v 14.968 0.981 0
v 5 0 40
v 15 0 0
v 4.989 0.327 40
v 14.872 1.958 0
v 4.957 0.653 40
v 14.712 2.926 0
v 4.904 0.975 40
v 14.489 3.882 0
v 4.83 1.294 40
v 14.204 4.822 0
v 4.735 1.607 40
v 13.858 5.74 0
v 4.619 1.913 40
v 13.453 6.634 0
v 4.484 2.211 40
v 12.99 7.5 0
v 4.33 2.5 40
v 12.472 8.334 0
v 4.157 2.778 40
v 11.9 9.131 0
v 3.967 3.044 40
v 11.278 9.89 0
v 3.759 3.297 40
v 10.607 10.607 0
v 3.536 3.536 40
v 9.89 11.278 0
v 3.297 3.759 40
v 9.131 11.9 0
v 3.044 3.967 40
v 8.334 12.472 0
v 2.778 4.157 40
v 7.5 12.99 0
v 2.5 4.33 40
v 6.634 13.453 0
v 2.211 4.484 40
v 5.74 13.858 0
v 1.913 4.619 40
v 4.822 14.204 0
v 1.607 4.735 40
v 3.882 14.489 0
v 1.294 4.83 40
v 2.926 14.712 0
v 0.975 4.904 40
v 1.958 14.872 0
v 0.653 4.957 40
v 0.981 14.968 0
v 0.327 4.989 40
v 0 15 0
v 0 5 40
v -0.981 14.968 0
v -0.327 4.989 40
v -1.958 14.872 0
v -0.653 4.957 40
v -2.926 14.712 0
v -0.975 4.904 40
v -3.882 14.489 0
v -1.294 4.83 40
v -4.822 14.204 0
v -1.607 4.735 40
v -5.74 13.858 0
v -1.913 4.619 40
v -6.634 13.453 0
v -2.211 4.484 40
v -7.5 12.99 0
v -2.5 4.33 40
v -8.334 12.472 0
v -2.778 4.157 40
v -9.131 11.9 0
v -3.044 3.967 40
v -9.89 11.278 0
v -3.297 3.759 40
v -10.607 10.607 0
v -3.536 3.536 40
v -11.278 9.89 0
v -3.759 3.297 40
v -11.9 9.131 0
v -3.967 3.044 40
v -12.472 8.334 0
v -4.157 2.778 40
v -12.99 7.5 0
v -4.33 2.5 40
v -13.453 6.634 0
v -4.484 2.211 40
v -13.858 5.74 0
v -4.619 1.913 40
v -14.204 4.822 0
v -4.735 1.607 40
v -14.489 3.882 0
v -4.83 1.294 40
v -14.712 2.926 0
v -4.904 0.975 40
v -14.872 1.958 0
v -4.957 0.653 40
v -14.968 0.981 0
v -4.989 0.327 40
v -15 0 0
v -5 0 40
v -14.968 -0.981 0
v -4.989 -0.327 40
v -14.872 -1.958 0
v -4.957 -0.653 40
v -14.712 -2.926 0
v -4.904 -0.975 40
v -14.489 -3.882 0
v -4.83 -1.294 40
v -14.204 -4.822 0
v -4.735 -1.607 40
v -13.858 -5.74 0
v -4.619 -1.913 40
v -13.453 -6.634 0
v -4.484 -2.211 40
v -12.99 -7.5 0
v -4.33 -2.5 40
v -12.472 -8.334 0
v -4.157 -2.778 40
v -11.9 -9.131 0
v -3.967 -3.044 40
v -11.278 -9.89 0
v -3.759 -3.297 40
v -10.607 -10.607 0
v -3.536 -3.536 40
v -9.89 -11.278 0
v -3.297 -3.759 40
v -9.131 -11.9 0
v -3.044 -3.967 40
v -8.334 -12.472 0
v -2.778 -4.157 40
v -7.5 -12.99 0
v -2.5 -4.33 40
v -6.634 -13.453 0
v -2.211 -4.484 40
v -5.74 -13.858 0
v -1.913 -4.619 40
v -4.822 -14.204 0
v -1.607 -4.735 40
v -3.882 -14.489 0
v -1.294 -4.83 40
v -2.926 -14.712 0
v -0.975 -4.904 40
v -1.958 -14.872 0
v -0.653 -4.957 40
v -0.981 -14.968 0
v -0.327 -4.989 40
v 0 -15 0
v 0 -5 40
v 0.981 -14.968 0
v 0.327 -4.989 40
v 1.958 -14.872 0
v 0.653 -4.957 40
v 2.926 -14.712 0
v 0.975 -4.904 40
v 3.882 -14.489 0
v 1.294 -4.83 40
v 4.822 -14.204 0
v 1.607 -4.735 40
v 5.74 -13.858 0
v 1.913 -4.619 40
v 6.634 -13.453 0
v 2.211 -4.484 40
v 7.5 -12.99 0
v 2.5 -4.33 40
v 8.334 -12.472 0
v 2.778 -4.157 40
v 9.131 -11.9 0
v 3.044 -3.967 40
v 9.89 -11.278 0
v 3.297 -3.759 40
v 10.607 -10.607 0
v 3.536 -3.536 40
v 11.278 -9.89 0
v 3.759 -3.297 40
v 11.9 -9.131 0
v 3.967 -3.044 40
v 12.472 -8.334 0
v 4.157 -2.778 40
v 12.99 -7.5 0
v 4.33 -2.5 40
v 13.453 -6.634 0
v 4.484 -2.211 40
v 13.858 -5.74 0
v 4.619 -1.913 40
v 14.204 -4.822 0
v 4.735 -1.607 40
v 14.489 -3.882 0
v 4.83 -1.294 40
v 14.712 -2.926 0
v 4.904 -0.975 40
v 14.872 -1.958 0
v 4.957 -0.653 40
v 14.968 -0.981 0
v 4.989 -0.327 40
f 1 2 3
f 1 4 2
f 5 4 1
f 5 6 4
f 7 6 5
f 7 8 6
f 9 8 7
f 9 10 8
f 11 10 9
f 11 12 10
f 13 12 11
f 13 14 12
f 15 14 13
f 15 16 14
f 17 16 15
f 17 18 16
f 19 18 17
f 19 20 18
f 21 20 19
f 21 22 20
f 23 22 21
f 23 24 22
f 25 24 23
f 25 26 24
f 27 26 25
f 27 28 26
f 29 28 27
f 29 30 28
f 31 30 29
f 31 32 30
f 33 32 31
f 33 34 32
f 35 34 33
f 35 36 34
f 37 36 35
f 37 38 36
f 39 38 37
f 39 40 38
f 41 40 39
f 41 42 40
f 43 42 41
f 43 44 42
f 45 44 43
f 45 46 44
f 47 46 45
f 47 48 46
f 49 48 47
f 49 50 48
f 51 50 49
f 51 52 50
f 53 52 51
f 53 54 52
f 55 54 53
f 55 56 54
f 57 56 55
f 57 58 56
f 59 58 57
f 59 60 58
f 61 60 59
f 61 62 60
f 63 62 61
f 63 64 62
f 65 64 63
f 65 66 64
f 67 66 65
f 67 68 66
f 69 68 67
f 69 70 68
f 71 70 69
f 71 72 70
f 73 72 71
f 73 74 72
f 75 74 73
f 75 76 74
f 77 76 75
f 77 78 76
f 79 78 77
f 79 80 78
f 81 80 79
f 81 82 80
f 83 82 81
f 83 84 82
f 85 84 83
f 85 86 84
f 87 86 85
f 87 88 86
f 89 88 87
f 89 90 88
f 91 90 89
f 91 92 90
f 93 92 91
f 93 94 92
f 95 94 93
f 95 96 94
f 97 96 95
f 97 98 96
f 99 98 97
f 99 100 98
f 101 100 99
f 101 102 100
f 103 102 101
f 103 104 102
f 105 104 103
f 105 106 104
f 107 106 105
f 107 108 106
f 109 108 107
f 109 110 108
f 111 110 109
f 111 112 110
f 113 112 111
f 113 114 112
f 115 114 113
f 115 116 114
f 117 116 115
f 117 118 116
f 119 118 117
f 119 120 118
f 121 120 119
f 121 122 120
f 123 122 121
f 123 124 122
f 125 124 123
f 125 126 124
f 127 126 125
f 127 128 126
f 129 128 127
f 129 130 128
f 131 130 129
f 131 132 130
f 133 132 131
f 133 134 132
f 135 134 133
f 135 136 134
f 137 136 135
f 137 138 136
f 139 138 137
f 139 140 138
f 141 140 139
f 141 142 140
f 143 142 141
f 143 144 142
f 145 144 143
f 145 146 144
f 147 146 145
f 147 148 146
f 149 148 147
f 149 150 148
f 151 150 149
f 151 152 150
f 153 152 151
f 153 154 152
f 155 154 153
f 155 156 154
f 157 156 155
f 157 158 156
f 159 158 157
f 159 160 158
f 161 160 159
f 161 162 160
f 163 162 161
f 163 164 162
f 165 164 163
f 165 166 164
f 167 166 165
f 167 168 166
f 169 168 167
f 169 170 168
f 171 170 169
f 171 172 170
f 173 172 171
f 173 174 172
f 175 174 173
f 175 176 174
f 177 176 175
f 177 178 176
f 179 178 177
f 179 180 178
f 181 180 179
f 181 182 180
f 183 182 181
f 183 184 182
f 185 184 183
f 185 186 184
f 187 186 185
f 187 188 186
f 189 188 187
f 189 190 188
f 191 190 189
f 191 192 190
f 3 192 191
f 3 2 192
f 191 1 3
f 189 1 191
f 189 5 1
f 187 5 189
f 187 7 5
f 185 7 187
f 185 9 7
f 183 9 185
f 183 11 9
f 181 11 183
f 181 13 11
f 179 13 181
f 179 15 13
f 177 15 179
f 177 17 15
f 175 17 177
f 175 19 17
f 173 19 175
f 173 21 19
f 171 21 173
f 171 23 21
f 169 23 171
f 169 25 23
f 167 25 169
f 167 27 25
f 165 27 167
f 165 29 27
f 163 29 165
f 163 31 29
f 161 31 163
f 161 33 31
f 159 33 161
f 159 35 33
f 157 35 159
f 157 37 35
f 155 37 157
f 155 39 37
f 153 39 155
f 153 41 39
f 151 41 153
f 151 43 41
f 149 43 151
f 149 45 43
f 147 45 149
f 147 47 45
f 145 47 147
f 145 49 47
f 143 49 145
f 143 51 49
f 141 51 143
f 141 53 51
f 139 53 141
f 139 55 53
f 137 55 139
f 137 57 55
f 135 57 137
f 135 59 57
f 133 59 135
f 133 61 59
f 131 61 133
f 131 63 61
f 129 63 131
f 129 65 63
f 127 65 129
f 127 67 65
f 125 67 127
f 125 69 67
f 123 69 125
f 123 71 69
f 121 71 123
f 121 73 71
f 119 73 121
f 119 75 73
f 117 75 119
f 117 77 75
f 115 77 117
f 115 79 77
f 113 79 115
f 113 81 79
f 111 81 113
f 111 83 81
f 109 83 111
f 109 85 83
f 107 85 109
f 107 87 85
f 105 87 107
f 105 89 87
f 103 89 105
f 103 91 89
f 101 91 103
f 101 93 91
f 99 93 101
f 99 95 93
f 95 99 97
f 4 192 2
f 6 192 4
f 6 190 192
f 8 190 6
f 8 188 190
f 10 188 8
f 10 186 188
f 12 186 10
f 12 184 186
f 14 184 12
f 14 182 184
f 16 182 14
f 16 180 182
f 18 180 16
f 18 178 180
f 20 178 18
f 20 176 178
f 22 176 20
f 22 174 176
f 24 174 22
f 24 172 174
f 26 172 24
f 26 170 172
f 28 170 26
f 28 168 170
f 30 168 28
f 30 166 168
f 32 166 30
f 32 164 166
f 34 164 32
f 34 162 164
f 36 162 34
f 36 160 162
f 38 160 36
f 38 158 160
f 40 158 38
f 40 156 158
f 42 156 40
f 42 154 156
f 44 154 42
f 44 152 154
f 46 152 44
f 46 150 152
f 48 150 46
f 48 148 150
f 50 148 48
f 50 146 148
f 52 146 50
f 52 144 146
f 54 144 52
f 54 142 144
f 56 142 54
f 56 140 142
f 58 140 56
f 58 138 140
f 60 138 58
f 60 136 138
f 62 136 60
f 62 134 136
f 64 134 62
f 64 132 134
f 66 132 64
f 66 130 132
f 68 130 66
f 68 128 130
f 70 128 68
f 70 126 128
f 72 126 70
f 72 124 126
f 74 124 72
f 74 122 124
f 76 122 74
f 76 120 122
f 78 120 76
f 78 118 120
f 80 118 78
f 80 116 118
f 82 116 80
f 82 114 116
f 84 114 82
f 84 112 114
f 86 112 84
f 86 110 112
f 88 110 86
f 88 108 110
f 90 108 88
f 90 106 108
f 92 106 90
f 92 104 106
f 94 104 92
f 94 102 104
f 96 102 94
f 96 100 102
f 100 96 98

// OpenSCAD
// ============================================
// CONE / FRUSTUM (parametric)
// ============================================
// param: base_diam=30, top_diam=10, height=40, center=false, $fn_shape=96
// CALL:
cone_shape(base_diam=30, top_diam=10, height=40, center=false, $fn_shape=96);

module cone_shape(base_diam=30, top_diam=10, height=40, center=false, $fn_shape=96) {
    $fn = $fn_shape;
    cylinder(h = height, d1 = base_diam, d2 = top_diam, center = center);
}
